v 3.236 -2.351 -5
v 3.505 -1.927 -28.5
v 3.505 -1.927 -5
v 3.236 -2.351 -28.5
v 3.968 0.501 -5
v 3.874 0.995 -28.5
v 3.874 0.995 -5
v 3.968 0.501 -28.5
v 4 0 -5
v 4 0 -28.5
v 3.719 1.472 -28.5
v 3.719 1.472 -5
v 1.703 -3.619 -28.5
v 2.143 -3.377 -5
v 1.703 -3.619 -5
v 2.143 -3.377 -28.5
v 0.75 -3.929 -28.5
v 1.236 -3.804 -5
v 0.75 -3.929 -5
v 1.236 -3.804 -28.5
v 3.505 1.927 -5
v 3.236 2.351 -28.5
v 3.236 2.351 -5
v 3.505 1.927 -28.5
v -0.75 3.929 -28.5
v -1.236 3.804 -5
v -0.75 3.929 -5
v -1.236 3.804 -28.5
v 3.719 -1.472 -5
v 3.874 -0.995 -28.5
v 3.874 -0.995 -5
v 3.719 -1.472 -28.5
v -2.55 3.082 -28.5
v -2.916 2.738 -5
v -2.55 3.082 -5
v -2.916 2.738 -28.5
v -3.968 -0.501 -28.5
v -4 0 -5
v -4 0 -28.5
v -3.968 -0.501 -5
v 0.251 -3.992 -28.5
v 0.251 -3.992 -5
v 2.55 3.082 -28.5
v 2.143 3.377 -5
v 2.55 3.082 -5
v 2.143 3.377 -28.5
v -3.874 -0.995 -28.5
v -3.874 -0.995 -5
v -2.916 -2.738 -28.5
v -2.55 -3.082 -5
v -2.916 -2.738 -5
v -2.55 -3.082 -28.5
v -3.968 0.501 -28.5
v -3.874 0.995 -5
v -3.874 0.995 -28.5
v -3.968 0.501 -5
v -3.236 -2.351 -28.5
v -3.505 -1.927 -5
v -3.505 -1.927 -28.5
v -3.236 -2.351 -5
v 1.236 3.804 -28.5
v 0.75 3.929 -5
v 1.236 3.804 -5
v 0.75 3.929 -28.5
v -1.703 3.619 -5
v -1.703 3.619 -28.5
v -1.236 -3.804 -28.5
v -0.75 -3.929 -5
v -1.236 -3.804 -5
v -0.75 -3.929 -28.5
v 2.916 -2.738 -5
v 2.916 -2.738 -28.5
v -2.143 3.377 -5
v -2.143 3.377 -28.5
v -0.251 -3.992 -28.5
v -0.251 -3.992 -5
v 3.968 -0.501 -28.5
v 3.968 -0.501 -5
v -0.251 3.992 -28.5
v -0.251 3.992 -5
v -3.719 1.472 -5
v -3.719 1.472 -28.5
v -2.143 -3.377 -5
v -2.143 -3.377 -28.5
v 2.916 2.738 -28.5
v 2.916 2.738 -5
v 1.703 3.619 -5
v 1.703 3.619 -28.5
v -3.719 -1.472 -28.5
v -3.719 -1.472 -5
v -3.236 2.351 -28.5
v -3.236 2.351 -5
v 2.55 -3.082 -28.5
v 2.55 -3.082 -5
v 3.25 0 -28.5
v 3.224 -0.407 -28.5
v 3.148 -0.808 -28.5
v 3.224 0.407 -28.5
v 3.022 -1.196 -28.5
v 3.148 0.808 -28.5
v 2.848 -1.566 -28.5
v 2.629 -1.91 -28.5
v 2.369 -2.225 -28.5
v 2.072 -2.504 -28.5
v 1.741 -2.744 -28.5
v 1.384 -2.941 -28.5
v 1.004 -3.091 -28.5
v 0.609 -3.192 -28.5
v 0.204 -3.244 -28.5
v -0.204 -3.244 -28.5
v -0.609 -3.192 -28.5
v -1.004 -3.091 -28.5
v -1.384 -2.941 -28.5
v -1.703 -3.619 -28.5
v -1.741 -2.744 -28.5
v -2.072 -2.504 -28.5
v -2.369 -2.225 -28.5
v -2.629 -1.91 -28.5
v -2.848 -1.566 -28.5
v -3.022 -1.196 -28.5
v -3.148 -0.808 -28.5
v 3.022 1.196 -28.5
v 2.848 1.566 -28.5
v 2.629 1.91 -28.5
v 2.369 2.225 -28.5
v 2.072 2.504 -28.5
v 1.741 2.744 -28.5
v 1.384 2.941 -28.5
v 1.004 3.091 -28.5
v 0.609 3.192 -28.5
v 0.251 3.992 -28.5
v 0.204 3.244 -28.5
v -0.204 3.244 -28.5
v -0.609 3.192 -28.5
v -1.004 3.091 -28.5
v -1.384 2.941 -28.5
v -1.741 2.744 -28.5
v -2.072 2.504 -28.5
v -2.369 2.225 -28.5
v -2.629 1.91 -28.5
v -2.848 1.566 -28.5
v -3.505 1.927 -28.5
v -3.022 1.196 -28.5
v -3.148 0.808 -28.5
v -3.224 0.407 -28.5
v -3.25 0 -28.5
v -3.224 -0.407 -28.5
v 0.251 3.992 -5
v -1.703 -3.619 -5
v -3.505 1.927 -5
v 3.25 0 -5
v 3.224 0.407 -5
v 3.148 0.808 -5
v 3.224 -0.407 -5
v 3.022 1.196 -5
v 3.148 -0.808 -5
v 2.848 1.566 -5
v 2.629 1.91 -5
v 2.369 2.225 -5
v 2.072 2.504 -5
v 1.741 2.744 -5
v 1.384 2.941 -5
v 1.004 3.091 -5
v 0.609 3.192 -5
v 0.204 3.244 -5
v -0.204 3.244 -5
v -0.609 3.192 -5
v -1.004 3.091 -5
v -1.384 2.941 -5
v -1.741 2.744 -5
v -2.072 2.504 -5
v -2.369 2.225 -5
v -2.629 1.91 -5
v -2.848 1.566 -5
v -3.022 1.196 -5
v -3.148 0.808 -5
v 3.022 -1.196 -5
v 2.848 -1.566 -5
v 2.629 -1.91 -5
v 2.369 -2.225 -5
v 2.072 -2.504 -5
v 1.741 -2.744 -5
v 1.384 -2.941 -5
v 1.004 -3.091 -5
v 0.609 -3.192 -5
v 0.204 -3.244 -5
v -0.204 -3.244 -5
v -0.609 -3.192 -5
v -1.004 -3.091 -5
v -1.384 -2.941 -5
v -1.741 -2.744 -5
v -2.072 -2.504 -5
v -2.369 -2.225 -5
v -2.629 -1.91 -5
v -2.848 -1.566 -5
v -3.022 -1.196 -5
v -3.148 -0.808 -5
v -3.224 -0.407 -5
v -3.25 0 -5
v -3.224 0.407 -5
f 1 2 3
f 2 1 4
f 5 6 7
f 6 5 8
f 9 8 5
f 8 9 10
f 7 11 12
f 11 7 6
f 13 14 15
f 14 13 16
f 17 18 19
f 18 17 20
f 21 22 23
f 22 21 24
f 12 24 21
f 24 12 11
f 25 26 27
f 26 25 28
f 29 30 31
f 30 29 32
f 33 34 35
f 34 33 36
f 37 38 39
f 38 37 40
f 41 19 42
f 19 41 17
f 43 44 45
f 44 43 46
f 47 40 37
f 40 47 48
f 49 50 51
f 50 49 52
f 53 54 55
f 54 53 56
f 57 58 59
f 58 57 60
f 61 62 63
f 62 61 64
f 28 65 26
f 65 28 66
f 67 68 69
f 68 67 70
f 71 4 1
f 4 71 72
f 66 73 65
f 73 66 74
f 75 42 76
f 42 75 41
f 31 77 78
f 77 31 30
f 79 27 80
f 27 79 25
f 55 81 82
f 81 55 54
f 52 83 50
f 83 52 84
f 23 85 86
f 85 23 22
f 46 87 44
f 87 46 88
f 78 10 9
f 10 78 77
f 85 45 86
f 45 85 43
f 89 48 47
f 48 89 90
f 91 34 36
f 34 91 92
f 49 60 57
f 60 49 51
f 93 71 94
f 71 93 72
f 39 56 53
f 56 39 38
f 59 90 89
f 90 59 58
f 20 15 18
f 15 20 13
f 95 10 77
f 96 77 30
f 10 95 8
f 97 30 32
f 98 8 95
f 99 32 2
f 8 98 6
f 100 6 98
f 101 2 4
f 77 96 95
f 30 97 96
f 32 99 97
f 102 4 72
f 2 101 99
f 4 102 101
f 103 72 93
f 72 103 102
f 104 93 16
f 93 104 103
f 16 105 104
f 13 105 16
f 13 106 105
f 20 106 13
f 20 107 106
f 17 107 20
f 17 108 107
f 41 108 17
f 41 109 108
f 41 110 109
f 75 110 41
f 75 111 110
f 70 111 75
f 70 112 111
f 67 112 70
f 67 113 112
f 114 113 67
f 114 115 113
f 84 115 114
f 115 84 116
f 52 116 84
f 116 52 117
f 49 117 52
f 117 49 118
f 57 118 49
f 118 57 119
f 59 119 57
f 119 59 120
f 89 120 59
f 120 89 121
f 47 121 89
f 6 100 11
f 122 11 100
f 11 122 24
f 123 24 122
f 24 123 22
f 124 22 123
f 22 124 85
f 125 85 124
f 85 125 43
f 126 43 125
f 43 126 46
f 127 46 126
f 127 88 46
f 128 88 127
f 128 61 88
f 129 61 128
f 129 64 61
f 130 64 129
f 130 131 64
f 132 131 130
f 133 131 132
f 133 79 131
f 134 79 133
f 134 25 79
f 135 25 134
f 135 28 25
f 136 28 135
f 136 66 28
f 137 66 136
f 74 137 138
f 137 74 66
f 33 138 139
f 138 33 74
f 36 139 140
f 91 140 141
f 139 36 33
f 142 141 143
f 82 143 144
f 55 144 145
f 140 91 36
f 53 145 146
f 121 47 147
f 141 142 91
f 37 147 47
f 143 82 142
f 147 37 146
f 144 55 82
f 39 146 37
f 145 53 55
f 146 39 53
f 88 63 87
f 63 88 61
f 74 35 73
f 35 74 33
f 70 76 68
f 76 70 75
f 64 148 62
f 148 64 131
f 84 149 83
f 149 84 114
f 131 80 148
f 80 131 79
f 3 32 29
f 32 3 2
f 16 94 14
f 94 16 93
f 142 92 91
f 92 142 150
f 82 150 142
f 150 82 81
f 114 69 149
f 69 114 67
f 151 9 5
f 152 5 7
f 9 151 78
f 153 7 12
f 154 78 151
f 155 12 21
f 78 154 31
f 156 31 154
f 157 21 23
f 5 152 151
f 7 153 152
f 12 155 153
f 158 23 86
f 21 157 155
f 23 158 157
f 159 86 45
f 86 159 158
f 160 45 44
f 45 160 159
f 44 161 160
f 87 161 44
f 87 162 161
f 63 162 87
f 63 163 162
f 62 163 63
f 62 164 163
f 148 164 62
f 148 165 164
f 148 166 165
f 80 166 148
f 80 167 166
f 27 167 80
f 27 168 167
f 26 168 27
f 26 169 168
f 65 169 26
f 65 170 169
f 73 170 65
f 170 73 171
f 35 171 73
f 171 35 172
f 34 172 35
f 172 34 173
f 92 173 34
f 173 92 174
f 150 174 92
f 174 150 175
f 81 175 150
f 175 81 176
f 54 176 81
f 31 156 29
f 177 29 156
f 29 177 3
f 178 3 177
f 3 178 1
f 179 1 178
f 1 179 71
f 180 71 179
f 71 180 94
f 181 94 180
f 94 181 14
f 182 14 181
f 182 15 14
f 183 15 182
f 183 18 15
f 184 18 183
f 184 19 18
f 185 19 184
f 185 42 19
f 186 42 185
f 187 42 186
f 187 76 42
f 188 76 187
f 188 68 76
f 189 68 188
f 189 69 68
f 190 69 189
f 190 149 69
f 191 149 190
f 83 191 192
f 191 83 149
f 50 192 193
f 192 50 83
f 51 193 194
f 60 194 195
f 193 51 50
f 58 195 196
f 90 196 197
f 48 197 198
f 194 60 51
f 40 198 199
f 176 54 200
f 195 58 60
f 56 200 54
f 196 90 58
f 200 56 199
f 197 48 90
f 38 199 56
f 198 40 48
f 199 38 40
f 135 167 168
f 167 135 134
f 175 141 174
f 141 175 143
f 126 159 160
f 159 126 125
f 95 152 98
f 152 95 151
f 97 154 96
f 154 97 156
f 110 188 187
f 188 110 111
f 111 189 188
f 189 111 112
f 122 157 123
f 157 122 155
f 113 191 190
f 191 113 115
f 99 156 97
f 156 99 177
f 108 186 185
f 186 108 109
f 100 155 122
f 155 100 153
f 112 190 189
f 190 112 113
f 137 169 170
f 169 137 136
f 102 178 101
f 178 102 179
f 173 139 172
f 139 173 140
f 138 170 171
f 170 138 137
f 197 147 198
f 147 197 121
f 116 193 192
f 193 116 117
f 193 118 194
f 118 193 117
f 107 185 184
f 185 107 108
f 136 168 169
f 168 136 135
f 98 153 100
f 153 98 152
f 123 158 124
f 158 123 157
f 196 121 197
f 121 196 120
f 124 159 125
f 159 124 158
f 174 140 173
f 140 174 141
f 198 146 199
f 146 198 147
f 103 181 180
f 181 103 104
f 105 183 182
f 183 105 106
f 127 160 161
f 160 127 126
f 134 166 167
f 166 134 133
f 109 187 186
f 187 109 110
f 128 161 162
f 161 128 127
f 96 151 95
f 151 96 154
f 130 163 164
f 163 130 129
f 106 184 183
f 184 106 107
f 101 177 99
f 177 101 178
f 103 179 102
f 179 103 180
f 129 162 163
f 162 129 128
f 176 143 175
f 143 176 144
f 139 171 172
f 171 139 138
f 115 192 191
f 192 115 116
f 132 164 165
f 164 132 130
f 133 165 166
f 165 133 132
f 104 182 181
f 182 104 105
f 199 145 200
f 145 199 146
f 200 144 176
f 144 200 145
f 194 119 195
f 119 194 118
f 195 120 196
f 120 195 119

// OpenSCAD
$fn = 50;

difference() {
	union() {
		translate(v = [0, 0, -28.5]) {
			cylinder(h = 28.5, r = 4.0);
		}
		#translate(v = [0, 0, -30.0]) {
			cylinder(h = 30, r = 2.875);
		}
	}
	union() {
		translate(v = [0, 0, 0]) {
			rotate(a = [0, 0, 0]) {
				difference() {
					union() {
						translate(v = [0, 0, -5]) {
							linear_extrude(height = 5) {
								polygon(points = [[5.914249999999999, 0.0], [2.957125, 5.1218907443321156], [-2.9571249999999982, 5.1218907443321156], [-5.914249999999999, 7.242867331857232e-16], [-2.9571250000000022, -5.121890744332115], [2.9571249999999956, -5.121890744332118]]);
							}
						}
					}
					union();
				}
			}
		}
		#translate(v = [0, 0, -100.0]) {
			cylinder(h = 200, r = 3.25);
		}
	}
}
